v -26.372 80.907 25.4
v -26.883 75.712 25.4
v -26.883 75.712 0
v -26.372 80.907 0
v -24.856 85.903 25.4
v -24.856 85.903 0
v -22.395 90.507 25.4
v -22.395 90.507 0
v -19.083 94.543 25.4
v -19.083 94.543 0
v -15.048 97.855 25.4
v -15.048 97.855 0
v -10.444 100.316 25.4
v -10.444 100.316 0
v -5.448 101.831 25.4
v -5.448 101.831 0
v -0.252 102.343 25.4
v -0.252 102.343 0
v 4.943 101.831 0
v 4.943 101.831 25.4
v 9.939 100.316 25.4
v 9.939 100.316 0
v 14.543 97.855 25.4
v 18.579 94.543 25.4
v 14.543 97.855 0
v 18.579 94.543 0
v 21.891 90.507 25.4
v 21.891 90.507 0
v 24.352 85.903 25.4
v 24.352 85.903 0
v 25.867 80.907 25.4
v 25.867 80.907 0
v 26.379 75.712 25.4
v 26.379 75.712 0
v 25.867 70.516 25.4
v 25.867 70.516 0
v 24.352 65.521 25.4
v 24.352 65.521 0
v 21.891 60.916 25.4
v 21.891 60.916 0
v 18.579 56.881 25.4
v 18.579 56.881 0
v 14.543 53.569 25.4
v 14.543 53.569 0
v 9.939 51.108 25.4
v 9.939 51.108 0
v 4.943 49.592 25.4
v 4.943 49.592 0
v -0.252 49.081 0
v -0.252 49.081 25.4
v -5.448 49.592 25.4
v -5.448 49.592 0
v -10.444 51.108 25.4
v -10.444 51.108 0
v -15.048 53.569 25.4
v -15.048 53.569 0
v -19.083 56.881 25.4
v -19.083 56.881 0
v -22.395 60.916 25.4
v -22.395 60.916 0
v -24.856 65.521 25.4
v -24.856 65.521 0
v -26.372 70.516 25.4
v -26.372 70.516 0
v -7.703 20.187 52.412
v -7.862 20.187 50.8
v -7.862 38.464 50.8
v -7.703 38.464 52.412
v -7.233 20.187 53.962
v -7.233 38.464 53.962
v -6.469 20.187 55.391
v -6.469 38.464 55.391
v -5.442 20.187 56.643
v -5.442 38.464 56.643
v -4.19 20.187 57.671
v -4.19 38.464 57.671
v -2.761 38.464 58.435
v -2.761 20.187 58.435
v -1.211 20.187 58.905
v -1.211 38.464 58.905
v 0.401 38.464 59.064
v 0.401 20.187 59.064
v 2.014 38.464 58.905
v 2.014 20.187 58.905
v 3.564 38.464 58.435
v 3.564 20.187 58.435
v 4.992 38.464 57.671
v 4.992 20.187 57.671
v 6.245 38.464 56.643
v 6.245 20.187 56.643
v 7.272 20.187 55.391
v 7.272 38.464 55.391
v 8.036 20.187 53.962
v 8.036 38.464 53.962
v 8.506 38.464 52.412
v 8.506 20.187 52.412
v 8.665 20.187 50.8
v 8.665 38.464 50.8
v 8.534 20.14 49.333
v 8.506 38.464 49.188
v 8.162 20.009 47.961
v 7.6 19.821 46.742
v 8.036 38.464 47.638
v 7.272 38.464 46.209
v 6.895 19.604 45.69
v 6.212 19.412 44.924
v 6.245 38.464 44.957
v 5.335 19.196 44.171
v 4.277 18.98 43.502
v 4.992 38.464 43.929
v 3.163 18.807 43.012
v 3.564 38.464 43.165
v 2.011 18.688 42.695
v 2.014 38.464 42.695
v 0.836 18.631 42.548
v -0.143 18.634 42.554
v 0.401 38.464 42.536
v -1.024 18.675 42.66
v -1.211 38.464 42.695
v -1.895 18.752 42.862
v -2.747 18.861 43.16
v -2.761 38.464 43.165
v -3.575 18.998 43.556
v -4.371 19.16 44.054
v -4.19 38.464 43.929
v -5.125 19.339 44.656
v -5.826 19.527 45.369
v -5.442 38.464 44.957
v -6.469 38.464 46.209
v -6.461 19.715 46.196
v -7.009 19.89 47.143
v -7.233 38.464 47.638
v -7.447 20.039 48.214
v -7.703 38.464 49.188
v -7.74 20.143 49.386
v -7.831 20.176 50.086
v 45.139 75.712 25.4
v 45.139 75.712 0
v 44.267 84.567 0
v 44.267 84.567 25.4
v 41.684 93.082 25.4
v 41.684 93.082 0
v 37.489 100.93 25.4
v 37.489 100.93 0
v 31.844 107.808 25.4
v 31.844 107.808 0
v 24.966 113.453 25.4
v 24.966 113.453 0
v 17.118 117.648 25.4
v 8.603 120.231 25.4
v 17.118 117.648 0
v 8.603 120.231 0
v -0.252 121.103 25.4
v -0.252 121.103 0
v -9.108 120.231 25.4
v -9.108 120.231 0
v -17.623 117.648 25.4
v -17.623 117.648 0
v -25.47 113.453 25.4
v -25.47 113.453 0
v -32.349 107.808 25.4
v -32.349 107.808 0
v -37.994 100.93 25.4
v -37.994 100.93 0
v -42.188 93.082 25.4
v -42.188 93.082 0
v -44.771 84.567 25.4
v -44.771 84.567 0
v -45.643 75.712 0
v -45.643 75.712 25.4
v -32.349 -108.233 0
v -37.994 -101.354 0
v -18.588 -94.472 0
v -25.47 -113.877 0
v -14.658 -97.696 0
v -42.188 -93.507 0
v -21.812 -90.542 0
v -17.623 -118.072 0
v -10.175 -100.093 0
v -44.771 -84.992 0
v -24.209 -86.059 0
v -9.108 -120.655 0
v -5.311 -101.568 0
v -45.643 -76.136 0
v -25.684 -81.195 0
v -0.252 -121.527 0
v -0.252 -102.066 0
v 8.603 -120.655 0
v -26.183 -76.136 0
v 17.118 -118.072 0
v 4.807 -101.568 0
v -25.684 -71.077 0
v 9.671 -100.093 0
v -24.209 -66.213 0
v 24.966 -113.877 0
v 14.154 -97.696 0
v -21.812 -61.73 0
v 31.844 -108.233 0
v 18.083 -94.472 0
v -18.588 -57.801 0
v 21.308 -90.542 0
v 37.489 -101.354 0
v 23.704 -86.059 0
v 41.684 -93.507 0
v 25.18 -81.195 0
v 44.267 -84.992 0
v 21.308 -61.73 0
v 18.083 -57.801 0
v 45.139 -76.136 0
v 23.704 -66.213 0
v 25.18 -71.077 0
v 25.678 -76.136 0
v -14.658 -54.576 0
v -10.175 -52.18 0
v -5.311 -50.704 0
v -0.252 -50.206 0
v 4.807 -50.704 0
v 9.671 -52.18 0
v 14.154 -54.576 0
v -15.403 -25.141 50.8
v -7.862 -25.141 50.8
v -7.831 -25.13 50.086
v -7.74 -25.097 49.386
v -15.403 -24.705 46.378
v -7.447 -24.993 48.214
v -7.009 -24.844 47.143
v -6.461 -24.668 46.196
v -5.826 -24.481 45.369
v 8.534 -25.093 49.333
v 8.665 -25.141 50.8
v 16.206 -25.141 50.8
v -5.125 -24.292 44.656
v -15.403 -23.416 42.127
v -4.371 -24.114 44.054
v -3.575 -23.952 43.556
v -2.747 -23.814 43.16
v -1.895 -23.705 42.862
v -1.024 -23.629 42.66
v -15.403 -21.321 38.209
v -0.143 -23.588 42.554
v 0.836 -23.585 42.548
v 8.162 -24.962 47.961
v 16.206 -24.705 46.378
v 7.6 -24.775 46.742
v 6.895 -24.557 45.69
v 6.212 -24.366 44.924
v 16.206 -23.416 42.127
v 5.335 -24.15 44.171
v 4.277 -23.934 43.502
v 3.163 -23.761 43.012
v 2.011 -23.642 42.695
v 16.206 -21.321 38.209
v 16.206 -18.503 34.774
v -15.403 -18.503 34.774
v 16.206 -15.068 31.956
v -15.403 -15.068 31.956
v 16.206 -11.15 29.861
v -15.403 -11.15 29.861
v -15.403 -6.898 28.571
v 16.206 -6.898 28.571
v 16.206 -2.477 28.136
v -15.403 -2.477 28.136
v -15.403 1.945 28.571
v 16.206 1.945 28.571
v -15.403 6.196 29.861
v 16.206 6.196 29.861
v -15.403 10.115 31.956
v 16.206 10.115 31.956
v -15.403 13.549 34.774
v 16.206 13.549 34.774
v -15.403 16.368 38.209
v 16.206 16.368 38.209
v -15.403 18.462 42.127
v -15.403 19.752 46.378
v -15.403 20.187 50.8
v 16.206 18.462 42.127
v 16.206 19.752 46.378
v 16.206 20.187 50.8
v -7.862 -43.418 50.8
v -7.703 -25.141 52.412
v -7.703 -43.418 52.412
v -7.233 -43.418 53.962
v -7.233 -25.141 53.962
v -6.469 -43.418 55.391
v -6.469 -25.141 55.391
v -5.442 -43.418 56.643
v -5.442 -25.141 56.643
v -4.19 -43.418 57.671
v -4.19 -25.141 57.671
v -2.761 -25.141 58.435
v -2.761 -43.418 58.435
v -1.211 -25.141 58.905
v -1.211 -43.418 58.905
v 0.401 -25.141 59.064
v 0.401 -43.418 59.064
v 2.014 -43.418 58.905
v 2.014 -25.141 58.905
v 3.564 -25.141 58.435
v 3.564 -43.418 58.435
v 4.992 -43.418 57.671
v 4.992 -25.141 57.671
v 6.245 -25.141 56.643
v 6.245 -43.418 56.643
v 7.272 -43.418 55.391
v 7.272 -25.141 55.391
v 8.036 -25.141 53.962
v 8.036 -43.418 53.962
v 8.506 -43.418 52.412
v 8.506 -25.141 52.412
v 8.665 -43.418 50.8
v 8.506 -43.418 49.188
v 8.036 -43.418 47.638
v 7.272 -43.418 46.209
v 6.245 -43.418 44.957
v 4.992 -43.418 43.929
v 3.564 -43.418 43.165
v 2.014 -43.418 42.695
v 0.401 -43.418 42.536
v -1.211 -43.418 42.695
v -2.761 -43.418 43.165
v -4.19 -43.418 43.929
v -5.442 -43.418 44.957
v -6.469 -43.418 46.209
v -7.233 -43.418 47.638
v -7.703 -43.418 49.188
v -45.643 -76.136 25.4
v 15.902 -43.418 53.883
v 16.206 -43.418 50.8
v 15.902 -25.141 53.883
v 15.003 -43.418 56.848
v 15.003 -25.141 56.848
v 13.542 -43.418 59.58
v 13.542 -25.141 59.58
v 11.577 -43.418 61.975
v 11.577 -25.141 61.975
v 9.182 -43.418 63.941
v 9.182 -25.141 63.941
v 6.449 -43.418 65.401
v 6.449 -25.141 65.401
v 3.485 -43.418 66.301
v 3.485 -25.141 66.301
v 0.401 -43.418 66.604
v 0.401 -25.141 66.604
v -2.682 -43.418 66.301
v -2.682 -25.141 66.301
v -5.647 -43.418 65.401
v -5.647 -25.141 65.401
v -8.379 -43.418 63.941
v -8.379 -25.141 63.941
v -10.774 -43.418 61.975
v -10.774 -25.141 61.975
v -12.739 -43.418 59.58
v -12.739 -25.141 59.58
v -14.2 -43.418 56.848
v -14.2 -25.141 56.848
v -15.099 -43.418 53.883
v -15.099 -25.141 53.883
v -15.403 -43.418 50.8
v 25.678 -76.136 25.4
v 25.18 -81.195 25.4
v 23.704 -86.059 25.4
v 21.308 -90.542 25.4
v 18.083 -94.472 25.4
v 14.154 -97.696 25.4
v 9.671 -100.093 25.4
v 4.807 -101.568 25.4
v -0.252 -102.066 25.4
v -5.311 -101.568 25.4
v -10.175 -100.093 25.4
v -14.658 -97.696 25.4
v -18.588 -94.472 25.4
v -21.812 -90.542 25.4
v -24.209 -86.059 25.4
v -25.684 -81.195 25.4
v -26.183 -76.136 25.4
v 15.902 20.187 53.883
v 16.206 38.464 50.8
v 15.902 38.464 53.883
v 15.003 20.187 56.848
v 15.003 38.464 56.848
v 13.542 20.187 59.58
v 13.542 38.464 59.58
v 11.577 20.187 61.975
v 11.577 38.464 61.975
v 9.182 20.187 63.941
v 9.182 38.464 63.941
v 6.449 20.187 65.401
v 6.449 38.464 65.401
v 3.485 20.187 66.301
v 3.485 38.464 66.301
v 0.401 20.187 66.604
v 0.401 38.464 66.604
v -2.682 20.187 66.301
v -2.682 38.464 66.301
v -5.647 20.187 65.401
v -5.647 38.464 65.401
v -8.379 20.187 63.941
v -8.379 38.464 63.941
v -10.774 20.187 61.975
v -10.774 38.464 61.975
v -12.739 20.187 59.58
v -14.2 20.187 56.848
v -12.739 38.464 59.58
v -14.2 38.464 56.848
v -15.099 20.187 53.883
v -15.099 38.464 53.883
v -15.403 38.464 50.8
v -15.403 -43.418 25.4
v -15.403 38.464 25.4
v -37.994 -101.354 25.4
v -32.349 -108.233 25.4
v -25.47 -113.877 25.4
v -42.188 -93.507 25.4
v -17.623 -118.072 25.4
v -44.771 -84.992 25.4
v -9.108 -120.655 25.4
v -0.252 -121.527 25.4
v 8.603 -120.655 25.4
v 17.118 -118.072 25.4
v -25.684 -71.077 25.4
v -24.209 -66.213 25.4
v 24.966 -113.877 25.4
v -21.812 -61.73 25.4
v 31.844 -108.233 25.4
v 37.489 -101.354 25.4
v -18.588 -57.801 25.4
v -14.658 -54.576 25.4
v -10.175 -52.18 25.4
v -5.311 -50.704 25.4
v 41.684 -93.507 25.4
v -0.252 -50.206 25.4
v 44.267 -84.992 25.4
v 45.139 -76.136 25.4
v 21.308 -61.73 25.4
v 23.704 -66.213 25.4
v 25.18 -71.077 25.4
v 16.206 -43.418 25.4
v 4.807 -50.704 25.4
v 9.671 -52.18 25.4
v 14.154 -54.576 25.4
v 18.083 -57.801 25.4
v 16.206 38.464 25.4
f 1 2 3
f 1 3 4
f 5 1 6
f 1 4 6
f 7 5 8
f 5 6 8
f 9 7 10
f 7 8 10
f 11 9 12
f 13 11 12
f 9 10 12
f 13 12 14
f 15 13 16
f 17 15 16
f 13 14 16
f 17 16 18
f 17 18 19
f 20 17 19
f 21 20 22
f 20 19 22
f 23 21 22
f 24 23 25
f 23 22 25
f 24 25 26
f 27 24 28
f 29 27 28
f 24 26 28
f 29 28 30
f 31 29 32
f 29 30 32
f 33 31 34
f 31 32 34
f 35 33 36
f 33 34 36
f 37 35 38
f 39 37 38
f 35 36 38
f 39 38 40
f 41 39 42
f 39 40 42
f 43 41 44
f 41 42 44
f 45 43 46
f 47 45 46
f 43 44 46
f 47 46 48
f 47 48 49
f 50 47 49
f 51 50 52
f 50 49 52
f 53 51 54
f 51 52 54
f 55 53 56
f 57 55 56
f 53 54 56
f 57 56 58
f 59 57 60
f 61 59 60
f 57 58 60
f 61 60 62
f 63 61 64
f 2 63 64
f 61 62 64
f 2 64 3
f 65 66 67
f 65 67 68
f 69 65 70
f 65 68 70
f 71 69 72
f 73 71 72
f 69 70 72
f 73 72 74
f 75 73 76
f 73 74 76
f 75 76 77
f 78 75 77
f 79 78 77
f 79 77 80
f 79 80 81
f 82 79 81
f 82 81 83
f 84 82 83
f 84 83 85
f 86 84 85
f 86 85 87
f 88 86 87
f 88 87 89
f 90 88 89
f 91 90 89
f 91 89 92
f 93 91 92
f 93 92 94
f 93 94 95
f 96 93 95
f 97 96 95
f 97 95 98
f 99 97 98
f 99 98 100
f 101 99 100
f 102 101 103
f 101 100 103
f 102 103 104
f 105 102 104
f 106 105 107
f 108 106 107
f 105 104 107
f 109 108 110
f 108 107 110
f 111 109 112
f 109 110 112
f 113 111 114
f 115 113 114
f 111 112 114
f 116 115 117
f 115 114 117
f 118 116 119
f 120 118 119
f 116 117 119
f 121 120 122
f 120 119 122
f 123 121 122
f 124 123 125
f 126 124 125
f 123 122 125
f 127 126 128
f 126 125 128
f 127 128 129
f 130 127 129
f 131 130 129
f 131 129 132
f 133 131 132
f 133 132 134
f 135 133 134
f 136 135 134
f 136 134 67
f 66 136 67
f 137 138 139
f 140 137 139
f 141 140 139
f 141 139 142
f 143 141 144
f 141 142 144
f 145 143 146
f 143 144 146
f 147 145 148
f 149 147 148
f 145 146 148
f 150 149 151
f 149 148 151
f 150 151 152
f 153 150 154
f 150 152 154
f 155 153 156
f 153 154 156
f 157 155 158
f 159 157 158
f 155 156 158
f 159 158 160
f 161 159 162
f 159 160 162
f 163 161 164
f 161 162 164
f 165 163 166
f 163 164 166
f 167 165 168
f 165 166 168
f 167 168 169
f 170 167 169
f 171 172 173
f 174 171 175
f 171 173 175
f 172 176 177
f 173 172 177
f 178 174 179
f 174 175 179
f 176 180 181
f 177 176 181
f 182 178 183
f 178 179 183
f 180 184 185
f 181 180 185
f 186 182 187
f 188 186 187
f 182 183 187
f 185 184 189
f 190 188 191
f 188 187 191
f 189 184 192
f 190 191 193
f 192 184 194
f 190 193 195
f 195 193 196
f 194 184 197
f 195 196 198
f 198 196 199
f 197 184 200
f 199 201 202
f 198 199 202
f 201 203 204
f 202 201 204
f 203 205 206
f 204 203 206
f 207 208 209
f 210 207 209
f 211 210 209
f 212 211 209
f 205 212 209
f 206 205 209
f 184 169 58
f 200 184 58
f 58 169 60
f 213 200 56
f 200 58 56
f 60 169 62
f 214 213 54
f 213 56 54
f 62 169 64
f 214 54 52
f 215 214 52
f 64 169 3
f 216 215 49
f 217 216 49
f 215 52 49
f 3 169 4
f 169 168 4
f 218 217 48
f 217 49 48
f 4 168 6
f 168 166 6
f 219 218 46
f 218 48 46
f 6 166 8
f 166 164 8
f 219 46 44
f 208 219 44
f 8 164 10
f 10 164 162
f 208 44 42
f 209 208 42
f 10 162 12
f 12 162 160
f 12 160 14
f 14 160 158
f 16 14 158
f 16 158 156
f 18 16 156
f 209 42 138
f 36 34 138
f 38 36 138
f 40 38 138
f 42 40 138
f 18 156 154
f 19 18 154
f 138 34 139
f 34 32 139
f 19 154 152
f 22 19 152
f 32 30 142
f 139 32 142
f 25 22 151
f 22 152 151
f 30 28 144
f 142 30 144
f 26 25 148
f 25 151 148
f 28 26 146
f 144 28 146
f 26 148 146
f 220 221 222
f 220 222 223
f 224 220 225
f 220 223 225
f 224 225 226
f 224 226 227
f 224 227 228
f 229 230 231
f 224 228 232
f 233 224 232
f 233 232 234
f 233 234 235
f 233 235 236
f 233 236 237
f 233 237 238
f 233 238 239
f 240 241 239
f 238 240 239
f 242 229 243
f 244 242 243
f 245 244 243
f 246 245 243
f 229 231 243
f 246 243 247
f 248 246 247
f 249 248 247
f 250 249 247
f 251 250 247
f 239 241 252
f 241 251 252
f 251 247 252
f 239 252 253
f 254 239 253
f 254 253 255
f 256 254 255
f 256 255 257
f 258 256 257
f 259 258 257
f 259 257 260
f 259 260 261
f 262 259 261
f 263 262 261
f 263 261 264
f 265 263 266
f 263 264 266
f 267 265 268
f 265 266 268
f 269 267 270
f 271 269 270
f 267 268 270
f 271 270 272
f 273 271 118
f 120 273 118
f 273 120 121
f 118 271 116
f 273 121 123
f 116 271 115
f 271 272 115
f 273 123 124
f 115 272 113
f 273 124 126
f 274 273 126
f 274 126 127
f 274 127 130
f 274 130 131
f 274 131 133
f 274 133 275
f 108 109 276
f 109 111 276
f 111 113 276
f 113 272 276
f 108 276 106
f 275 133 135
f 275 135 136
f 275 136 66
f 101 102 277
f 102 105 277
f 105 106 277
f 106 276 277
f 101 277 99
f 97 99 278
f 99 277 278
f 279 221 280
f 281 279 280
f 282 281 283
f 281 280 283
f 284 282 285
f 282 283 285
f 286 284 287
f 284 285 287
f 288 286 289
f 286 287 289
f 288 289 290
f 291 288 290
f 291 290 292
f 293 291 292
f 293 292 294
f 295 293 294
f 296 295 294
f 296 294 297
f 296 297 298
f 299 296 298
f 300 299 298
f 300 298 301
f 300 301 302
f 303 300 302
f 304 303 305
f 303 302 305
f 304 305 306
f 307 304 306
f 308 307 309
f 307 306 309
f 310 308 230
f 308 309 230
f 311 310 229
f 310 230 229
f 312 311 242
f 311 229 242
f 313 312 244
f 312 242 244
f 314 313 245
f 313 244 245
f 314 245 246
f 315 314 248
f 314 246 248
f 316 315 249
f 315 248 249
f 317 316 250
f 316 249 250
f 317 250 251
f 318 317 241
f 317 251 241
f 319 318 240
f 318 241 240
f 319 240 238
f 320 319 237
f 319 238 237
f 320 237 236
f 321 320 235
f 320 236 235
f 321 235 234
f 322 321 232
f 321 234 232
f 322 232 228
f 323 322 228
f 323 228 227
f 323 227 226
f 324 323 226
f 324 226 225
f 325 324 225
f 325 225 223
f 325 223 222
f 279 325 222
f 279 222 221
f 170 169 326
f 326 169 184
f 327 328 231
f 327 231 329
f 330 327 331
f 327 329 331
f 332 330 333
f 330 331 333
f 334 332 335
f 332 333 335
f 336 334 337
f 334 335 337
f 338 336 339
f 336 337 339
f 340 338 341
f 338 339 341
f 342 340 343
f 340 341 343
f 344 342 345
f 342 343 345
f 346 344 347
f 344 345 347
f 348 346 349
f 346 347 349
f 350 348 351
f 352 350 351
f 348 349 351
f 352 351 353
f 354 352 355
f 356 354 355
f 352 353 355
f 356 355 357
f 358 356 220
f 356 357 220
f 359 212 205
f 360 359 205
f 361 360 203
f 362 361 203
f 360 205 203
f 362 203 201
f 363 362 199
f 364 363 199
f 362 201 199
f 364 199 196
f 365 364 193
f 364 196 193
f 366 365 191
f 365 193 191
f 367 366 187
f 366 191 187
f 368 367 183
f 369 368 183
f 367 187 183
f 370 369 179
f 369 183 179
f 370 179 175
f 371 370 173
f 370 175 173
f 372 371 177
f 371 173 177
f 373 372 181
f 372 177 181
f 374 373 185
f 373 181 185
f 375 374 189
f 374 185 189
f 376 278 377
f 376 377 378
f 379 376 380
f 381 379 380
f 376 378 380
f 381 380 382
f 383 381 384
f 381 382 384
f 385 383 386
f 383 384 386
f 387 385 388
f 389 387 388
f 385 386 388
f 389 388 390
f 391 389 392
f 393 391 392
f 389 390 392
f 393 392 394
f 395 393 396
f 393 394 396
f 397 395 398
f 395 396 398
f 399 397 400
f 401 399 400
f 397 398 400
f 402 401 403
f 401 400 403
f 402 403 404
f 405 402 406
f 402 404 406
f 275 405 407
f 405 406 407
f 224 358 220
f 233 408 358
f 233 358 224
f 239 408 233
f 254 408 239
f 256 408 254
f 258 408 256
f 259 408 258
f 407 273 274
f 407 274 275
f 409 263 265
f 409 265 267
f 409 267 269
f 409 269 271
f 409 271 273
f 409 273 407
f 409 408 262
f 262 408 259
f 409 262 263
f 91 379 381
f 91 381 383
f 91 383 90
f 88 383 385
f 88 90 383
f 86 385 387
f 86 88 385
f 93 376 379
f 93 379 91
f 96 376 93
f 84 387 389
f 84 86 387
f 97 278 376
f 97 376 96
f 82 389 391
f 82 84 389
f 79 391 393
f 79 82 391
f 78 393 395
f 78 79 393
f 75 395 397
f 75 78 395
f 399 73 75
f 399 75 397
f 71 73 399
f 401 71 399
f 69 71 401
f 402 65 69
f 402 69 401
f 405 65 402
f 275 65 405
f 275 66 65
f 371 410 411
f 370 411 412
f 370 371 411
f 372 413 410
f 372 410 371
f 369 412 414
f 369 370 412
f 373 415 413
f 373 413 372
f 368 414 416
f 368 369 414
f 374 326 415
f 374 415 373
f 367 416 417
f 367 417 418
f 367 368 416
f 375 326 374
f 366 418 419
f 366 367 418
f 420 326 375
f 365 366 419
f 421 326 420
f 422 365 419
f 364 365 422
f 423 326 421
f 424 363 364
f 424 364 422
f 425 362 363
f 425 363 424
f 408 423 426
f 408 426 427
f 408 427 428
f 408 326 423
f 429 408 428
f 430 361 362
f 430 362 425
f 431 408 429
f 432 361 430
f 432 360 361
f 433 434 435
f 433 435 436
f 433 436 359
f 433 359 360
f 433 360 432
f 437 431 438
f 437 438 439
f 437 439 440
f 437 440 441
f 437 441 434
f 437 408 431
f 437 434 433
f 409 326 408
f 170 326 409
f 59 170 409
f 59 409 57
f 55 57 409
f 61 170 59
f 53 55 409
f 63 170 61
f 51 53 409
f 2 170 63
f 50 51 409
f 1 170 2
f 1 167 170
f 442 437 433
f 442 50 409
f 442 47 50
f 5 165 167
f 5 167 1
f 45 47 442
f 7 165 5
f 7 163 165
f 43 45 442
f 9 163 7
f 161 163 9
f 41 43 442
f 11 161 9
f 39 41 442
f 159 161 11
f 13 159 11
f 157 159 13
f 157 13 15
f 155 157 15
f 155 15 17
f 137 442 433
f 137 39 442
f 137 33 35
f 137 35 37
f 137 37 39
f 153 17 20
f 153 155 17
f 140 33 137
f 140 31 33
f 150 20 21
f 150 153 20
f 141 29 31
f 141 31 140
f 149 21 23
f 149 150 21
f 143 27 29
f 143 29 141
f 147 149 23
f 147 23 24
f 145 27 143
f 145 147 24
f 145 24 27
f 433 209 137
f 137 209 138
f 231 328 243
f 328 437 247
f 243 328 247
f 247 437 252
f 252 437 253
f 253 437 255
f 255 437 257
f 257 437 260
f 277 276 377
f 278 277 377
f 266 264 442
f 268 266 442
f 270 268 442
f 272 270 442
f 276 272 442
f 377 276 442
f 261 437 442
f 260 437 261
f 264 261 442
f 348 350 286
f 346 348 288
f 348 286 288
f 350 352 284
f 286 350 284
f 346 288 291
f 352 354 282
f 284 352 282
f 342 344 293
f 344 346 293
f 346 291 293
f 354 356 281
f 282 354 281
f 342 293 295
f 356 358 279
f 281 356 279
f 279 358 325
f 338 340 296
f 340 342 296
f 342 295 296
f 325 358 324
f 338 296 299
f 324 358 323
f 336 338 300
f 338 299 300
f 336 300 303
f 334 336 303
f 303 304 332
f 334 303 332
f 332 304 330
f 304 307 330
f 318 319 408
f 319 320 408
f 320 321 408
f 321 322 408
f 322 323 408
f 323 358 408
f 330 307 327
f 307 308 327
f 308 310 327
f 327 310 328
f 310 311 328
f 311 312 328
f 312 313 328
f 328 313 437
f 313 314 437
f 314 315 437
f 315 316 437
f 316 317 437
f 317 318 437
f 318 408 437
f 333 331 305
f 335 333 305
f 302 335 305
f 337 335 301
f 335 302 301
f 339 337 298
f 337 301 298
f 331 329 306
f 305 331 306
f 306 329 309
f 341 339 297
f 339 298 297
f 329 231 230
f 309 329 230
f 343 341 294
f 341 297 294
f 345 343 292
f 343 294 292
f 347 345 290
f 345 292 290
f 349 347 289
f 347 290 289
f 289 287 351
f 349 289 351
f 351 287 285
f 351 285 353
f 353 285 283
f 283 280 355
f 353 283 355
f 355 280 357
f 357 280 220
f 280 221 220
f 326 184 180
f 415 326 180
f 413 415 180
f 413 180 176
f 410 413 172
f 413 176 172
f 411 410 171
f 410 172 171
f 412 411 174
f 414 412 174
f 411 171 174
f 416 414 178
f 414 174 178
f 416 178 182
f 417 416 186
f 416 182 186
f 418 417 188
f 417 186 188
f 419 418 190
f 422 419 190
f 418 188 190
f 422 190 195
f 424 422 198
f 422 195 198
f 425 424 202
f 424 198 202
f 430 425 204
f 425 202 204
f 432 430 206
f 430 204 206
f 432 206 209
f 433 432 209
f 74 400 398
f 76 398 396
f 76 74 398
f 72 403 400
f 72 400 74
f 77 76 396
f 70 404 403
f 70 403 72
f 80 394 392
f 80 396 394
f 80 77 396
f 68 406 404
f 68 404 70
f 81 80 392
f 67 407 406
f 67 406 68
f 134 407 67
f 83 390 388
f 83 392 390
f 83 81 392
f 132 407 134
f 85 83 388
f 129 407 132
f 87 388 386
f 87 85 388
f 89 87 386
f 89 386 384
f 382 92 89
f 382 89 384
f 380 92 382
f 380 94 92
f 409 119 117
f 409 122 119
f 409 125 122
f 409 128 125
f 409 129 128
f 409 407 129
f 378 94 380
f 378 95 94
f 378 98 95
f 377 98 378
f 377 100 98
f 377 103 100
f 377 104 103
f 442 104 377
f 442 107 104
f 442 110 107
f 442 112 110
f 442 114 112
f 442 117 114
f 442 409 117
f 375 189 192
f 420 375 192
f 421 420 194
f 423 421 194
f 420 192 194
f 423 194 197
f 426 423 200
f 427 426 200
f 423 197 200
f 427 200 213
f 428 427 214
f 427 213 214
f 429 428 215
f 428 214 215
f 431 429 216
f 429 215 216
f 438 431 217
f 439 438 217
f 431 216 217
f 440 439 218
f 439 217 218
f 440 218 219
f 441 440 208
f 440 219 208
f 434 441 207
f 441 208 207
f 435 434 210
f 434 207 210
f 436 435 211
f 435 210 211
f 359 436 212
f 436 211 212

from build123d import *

# Parameters (mm, degrees)
F1_DEPTH  = 25.4
F2_W      = 31.608661
F2_H      = 81.88197
F3_DEPTH  = 50.8
F5_DEPTH  = 76.2
F6_W      = 15.80433
F6_H      = 18.276912
F8_W      = 15.80433
F8_H      = 18.276912
F10_R     = 8.263527
F11_DEPTH = 135.636


with BuildPart() as f1:
    # F0 (on Top) → F1 (new body)
    with BuildSketch(Plane.XY):
        with BuildLine():
            Line((45.138903, 75.711831), (26.379006, 75.711831))
            ThreePointArc((26.379006, 75.711831), (-0.25221, 49.080616), (-26.883425, 75.711831))
            Line((-26.883425, 75.711831), (-45.643322, 75.711831))
            Line((-45.643322, 75.711831), (-45.643322, -76.136142))
            Line((-45.643322, -76.136142), (-26.182505, -76.136142))
            ThreePointArc((-26.182505, -76.136142), (-0.25221, -50.205846), (25.678086, -76.136142))
            Line((25.678086, -76.136142), (45.138903, -76.136142))
            Line((45.138903, -76.136142), (45.138903, 75.711831))
        make_face()
        with BuildLine():
            ThreePointArc((-26.883425, 75.711831), (-0.25221, 102.343047), (26.379006, 75.711831))
            Line((26.379006, 75.711831), (45.138903, 75.711831))
            ThreePointArc((45.138903, 75.711831), (-0.25221, 121.102944), (-45.643322, 75.711831))
            Line((-45.643322, 75.711831), (-26.883425, 75.711831))
        make_face()
        with BuildLine():
            ThreePointArc((-45.643322, -76.136142), (-0.25221, -121.527255), (45.138903, -76.136142))
            Line((45.138903, -76.136142), (25.678086, -76.136142))
            ThreePointArc((25.678086, -76.136142), (-0.25221, -102.066438), (-26.182505, -76.136142))
            Line((-26.182505, -76.136142), (-45.643322, -76.136142))
        make_face()
    extrude(amount=F1_DEPTH)

    # F2 (on Top) → F3 (join)
    with BuildSketch(Plane.XY):
        with Locations((0.401416, -2.476901)):
            Rectangle(F2_W, F2_H)
    extrude(amount=F3_DEPTH)

    # F4 (on face) → F5 (cut)
    with BuildSketch(Plane.YZ.offset(16.205747)):
        with BuildLine():
            ThreePointArc((-25.140974, 50.8), (-2.476901, 28.135927), (20.187172, 50.8))
            Line((20.187172, 50.8), (-25.140974, 50.8))
        make_face()
        with BuildLine():
            Line((-25.140974, 50.8), (20.187172, 50.8))
            ThreePointArc((20.187172, 50.8), (-2.476901, 73.464073), (-25.140974, 50.8))
        make_face()
    extrude(amount=-F5_DEPTH, mode=Mode.SUBTRACT)

    # F6 (on face) → F7 (revolve)
    with BuildSketch(Plane.XY.offset(50.8)):
        with Locations((-7.500749, -34.27943)):
            Rectangle(F6_W, F6_H)
    revolve(axis=Axis((0.401416, -34.27943, 50.8), (0, -1, 0)))

    # F8 (on face) → F9 (revolve)
    with BuildSketch(Plane.XY.offset(50.8)):
        with Locations((-7.500749, 29.325628)):
            Rectangle(F8_W, F8_H)
    revolve(axis=Axis((0.401416, 29.325628, 50.8), (0, -1, 0)))

    # F10 (on face) → F11 (cut)
    with BuildSketch(Plane(origin=(0, 38.464084, 0), x_dir=(-1, 0, 0), z_dir=(0, 1, 0))):
        with Locations((-0.401416, 50.8)):
            Circle(F10_R)
    extrude(amount=-F11_DEPTH, mode=Mode.SUBTRACT)


solid = f1.part
